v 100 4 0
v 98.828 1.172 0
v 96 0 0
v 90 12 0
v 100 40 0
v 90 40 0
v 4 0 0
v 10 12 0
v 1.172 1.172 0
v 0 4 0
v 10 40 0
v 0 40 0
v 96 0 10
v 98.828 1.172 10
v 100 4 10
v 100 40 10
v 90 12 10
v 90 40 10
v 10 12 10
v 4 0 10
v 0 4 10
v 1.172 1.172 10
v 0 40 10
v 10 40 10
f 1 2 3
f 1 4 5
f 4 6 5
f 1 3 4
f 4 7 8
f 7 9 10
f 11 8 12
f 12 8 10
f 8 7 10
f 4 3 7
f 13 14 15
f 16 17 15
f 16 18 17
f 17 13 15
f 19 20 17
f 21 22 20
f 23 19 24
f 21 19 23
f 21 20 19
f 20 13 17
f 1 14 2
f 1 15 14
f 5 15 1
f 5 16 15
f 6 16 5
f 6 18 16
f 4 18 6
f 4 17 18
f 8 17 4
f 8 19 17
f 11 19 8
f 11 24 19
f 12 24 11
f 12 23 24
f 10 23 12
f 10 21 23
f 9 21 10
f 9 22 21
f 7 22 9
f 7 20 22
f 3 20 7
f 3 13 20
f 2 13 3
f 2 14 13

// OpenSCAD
$fn = 32;

// ----------------------------------------------------------------------
// Heat sink frame: 100 x 40 mm frame, 10 mm walls
// ----------------------------------------------------------------------

// --- parameters (mm) ---
profile_height = 10;      // extrusion height
profile_points = 12;      // points of the closed outline

profile = [[0, 4], [1.172, 1.172], [4, 0], [96, 0], [98.828, 1.172], [100, 4], [100, 40], [90, 40], [90, 12], [10, 12], [10, 40], [0, 40]];  // single closed polygon, 12 points, counter clockwise

// --- the one profile operation ---
linear_extrude(height = profile_height) polygon(points = profile);
